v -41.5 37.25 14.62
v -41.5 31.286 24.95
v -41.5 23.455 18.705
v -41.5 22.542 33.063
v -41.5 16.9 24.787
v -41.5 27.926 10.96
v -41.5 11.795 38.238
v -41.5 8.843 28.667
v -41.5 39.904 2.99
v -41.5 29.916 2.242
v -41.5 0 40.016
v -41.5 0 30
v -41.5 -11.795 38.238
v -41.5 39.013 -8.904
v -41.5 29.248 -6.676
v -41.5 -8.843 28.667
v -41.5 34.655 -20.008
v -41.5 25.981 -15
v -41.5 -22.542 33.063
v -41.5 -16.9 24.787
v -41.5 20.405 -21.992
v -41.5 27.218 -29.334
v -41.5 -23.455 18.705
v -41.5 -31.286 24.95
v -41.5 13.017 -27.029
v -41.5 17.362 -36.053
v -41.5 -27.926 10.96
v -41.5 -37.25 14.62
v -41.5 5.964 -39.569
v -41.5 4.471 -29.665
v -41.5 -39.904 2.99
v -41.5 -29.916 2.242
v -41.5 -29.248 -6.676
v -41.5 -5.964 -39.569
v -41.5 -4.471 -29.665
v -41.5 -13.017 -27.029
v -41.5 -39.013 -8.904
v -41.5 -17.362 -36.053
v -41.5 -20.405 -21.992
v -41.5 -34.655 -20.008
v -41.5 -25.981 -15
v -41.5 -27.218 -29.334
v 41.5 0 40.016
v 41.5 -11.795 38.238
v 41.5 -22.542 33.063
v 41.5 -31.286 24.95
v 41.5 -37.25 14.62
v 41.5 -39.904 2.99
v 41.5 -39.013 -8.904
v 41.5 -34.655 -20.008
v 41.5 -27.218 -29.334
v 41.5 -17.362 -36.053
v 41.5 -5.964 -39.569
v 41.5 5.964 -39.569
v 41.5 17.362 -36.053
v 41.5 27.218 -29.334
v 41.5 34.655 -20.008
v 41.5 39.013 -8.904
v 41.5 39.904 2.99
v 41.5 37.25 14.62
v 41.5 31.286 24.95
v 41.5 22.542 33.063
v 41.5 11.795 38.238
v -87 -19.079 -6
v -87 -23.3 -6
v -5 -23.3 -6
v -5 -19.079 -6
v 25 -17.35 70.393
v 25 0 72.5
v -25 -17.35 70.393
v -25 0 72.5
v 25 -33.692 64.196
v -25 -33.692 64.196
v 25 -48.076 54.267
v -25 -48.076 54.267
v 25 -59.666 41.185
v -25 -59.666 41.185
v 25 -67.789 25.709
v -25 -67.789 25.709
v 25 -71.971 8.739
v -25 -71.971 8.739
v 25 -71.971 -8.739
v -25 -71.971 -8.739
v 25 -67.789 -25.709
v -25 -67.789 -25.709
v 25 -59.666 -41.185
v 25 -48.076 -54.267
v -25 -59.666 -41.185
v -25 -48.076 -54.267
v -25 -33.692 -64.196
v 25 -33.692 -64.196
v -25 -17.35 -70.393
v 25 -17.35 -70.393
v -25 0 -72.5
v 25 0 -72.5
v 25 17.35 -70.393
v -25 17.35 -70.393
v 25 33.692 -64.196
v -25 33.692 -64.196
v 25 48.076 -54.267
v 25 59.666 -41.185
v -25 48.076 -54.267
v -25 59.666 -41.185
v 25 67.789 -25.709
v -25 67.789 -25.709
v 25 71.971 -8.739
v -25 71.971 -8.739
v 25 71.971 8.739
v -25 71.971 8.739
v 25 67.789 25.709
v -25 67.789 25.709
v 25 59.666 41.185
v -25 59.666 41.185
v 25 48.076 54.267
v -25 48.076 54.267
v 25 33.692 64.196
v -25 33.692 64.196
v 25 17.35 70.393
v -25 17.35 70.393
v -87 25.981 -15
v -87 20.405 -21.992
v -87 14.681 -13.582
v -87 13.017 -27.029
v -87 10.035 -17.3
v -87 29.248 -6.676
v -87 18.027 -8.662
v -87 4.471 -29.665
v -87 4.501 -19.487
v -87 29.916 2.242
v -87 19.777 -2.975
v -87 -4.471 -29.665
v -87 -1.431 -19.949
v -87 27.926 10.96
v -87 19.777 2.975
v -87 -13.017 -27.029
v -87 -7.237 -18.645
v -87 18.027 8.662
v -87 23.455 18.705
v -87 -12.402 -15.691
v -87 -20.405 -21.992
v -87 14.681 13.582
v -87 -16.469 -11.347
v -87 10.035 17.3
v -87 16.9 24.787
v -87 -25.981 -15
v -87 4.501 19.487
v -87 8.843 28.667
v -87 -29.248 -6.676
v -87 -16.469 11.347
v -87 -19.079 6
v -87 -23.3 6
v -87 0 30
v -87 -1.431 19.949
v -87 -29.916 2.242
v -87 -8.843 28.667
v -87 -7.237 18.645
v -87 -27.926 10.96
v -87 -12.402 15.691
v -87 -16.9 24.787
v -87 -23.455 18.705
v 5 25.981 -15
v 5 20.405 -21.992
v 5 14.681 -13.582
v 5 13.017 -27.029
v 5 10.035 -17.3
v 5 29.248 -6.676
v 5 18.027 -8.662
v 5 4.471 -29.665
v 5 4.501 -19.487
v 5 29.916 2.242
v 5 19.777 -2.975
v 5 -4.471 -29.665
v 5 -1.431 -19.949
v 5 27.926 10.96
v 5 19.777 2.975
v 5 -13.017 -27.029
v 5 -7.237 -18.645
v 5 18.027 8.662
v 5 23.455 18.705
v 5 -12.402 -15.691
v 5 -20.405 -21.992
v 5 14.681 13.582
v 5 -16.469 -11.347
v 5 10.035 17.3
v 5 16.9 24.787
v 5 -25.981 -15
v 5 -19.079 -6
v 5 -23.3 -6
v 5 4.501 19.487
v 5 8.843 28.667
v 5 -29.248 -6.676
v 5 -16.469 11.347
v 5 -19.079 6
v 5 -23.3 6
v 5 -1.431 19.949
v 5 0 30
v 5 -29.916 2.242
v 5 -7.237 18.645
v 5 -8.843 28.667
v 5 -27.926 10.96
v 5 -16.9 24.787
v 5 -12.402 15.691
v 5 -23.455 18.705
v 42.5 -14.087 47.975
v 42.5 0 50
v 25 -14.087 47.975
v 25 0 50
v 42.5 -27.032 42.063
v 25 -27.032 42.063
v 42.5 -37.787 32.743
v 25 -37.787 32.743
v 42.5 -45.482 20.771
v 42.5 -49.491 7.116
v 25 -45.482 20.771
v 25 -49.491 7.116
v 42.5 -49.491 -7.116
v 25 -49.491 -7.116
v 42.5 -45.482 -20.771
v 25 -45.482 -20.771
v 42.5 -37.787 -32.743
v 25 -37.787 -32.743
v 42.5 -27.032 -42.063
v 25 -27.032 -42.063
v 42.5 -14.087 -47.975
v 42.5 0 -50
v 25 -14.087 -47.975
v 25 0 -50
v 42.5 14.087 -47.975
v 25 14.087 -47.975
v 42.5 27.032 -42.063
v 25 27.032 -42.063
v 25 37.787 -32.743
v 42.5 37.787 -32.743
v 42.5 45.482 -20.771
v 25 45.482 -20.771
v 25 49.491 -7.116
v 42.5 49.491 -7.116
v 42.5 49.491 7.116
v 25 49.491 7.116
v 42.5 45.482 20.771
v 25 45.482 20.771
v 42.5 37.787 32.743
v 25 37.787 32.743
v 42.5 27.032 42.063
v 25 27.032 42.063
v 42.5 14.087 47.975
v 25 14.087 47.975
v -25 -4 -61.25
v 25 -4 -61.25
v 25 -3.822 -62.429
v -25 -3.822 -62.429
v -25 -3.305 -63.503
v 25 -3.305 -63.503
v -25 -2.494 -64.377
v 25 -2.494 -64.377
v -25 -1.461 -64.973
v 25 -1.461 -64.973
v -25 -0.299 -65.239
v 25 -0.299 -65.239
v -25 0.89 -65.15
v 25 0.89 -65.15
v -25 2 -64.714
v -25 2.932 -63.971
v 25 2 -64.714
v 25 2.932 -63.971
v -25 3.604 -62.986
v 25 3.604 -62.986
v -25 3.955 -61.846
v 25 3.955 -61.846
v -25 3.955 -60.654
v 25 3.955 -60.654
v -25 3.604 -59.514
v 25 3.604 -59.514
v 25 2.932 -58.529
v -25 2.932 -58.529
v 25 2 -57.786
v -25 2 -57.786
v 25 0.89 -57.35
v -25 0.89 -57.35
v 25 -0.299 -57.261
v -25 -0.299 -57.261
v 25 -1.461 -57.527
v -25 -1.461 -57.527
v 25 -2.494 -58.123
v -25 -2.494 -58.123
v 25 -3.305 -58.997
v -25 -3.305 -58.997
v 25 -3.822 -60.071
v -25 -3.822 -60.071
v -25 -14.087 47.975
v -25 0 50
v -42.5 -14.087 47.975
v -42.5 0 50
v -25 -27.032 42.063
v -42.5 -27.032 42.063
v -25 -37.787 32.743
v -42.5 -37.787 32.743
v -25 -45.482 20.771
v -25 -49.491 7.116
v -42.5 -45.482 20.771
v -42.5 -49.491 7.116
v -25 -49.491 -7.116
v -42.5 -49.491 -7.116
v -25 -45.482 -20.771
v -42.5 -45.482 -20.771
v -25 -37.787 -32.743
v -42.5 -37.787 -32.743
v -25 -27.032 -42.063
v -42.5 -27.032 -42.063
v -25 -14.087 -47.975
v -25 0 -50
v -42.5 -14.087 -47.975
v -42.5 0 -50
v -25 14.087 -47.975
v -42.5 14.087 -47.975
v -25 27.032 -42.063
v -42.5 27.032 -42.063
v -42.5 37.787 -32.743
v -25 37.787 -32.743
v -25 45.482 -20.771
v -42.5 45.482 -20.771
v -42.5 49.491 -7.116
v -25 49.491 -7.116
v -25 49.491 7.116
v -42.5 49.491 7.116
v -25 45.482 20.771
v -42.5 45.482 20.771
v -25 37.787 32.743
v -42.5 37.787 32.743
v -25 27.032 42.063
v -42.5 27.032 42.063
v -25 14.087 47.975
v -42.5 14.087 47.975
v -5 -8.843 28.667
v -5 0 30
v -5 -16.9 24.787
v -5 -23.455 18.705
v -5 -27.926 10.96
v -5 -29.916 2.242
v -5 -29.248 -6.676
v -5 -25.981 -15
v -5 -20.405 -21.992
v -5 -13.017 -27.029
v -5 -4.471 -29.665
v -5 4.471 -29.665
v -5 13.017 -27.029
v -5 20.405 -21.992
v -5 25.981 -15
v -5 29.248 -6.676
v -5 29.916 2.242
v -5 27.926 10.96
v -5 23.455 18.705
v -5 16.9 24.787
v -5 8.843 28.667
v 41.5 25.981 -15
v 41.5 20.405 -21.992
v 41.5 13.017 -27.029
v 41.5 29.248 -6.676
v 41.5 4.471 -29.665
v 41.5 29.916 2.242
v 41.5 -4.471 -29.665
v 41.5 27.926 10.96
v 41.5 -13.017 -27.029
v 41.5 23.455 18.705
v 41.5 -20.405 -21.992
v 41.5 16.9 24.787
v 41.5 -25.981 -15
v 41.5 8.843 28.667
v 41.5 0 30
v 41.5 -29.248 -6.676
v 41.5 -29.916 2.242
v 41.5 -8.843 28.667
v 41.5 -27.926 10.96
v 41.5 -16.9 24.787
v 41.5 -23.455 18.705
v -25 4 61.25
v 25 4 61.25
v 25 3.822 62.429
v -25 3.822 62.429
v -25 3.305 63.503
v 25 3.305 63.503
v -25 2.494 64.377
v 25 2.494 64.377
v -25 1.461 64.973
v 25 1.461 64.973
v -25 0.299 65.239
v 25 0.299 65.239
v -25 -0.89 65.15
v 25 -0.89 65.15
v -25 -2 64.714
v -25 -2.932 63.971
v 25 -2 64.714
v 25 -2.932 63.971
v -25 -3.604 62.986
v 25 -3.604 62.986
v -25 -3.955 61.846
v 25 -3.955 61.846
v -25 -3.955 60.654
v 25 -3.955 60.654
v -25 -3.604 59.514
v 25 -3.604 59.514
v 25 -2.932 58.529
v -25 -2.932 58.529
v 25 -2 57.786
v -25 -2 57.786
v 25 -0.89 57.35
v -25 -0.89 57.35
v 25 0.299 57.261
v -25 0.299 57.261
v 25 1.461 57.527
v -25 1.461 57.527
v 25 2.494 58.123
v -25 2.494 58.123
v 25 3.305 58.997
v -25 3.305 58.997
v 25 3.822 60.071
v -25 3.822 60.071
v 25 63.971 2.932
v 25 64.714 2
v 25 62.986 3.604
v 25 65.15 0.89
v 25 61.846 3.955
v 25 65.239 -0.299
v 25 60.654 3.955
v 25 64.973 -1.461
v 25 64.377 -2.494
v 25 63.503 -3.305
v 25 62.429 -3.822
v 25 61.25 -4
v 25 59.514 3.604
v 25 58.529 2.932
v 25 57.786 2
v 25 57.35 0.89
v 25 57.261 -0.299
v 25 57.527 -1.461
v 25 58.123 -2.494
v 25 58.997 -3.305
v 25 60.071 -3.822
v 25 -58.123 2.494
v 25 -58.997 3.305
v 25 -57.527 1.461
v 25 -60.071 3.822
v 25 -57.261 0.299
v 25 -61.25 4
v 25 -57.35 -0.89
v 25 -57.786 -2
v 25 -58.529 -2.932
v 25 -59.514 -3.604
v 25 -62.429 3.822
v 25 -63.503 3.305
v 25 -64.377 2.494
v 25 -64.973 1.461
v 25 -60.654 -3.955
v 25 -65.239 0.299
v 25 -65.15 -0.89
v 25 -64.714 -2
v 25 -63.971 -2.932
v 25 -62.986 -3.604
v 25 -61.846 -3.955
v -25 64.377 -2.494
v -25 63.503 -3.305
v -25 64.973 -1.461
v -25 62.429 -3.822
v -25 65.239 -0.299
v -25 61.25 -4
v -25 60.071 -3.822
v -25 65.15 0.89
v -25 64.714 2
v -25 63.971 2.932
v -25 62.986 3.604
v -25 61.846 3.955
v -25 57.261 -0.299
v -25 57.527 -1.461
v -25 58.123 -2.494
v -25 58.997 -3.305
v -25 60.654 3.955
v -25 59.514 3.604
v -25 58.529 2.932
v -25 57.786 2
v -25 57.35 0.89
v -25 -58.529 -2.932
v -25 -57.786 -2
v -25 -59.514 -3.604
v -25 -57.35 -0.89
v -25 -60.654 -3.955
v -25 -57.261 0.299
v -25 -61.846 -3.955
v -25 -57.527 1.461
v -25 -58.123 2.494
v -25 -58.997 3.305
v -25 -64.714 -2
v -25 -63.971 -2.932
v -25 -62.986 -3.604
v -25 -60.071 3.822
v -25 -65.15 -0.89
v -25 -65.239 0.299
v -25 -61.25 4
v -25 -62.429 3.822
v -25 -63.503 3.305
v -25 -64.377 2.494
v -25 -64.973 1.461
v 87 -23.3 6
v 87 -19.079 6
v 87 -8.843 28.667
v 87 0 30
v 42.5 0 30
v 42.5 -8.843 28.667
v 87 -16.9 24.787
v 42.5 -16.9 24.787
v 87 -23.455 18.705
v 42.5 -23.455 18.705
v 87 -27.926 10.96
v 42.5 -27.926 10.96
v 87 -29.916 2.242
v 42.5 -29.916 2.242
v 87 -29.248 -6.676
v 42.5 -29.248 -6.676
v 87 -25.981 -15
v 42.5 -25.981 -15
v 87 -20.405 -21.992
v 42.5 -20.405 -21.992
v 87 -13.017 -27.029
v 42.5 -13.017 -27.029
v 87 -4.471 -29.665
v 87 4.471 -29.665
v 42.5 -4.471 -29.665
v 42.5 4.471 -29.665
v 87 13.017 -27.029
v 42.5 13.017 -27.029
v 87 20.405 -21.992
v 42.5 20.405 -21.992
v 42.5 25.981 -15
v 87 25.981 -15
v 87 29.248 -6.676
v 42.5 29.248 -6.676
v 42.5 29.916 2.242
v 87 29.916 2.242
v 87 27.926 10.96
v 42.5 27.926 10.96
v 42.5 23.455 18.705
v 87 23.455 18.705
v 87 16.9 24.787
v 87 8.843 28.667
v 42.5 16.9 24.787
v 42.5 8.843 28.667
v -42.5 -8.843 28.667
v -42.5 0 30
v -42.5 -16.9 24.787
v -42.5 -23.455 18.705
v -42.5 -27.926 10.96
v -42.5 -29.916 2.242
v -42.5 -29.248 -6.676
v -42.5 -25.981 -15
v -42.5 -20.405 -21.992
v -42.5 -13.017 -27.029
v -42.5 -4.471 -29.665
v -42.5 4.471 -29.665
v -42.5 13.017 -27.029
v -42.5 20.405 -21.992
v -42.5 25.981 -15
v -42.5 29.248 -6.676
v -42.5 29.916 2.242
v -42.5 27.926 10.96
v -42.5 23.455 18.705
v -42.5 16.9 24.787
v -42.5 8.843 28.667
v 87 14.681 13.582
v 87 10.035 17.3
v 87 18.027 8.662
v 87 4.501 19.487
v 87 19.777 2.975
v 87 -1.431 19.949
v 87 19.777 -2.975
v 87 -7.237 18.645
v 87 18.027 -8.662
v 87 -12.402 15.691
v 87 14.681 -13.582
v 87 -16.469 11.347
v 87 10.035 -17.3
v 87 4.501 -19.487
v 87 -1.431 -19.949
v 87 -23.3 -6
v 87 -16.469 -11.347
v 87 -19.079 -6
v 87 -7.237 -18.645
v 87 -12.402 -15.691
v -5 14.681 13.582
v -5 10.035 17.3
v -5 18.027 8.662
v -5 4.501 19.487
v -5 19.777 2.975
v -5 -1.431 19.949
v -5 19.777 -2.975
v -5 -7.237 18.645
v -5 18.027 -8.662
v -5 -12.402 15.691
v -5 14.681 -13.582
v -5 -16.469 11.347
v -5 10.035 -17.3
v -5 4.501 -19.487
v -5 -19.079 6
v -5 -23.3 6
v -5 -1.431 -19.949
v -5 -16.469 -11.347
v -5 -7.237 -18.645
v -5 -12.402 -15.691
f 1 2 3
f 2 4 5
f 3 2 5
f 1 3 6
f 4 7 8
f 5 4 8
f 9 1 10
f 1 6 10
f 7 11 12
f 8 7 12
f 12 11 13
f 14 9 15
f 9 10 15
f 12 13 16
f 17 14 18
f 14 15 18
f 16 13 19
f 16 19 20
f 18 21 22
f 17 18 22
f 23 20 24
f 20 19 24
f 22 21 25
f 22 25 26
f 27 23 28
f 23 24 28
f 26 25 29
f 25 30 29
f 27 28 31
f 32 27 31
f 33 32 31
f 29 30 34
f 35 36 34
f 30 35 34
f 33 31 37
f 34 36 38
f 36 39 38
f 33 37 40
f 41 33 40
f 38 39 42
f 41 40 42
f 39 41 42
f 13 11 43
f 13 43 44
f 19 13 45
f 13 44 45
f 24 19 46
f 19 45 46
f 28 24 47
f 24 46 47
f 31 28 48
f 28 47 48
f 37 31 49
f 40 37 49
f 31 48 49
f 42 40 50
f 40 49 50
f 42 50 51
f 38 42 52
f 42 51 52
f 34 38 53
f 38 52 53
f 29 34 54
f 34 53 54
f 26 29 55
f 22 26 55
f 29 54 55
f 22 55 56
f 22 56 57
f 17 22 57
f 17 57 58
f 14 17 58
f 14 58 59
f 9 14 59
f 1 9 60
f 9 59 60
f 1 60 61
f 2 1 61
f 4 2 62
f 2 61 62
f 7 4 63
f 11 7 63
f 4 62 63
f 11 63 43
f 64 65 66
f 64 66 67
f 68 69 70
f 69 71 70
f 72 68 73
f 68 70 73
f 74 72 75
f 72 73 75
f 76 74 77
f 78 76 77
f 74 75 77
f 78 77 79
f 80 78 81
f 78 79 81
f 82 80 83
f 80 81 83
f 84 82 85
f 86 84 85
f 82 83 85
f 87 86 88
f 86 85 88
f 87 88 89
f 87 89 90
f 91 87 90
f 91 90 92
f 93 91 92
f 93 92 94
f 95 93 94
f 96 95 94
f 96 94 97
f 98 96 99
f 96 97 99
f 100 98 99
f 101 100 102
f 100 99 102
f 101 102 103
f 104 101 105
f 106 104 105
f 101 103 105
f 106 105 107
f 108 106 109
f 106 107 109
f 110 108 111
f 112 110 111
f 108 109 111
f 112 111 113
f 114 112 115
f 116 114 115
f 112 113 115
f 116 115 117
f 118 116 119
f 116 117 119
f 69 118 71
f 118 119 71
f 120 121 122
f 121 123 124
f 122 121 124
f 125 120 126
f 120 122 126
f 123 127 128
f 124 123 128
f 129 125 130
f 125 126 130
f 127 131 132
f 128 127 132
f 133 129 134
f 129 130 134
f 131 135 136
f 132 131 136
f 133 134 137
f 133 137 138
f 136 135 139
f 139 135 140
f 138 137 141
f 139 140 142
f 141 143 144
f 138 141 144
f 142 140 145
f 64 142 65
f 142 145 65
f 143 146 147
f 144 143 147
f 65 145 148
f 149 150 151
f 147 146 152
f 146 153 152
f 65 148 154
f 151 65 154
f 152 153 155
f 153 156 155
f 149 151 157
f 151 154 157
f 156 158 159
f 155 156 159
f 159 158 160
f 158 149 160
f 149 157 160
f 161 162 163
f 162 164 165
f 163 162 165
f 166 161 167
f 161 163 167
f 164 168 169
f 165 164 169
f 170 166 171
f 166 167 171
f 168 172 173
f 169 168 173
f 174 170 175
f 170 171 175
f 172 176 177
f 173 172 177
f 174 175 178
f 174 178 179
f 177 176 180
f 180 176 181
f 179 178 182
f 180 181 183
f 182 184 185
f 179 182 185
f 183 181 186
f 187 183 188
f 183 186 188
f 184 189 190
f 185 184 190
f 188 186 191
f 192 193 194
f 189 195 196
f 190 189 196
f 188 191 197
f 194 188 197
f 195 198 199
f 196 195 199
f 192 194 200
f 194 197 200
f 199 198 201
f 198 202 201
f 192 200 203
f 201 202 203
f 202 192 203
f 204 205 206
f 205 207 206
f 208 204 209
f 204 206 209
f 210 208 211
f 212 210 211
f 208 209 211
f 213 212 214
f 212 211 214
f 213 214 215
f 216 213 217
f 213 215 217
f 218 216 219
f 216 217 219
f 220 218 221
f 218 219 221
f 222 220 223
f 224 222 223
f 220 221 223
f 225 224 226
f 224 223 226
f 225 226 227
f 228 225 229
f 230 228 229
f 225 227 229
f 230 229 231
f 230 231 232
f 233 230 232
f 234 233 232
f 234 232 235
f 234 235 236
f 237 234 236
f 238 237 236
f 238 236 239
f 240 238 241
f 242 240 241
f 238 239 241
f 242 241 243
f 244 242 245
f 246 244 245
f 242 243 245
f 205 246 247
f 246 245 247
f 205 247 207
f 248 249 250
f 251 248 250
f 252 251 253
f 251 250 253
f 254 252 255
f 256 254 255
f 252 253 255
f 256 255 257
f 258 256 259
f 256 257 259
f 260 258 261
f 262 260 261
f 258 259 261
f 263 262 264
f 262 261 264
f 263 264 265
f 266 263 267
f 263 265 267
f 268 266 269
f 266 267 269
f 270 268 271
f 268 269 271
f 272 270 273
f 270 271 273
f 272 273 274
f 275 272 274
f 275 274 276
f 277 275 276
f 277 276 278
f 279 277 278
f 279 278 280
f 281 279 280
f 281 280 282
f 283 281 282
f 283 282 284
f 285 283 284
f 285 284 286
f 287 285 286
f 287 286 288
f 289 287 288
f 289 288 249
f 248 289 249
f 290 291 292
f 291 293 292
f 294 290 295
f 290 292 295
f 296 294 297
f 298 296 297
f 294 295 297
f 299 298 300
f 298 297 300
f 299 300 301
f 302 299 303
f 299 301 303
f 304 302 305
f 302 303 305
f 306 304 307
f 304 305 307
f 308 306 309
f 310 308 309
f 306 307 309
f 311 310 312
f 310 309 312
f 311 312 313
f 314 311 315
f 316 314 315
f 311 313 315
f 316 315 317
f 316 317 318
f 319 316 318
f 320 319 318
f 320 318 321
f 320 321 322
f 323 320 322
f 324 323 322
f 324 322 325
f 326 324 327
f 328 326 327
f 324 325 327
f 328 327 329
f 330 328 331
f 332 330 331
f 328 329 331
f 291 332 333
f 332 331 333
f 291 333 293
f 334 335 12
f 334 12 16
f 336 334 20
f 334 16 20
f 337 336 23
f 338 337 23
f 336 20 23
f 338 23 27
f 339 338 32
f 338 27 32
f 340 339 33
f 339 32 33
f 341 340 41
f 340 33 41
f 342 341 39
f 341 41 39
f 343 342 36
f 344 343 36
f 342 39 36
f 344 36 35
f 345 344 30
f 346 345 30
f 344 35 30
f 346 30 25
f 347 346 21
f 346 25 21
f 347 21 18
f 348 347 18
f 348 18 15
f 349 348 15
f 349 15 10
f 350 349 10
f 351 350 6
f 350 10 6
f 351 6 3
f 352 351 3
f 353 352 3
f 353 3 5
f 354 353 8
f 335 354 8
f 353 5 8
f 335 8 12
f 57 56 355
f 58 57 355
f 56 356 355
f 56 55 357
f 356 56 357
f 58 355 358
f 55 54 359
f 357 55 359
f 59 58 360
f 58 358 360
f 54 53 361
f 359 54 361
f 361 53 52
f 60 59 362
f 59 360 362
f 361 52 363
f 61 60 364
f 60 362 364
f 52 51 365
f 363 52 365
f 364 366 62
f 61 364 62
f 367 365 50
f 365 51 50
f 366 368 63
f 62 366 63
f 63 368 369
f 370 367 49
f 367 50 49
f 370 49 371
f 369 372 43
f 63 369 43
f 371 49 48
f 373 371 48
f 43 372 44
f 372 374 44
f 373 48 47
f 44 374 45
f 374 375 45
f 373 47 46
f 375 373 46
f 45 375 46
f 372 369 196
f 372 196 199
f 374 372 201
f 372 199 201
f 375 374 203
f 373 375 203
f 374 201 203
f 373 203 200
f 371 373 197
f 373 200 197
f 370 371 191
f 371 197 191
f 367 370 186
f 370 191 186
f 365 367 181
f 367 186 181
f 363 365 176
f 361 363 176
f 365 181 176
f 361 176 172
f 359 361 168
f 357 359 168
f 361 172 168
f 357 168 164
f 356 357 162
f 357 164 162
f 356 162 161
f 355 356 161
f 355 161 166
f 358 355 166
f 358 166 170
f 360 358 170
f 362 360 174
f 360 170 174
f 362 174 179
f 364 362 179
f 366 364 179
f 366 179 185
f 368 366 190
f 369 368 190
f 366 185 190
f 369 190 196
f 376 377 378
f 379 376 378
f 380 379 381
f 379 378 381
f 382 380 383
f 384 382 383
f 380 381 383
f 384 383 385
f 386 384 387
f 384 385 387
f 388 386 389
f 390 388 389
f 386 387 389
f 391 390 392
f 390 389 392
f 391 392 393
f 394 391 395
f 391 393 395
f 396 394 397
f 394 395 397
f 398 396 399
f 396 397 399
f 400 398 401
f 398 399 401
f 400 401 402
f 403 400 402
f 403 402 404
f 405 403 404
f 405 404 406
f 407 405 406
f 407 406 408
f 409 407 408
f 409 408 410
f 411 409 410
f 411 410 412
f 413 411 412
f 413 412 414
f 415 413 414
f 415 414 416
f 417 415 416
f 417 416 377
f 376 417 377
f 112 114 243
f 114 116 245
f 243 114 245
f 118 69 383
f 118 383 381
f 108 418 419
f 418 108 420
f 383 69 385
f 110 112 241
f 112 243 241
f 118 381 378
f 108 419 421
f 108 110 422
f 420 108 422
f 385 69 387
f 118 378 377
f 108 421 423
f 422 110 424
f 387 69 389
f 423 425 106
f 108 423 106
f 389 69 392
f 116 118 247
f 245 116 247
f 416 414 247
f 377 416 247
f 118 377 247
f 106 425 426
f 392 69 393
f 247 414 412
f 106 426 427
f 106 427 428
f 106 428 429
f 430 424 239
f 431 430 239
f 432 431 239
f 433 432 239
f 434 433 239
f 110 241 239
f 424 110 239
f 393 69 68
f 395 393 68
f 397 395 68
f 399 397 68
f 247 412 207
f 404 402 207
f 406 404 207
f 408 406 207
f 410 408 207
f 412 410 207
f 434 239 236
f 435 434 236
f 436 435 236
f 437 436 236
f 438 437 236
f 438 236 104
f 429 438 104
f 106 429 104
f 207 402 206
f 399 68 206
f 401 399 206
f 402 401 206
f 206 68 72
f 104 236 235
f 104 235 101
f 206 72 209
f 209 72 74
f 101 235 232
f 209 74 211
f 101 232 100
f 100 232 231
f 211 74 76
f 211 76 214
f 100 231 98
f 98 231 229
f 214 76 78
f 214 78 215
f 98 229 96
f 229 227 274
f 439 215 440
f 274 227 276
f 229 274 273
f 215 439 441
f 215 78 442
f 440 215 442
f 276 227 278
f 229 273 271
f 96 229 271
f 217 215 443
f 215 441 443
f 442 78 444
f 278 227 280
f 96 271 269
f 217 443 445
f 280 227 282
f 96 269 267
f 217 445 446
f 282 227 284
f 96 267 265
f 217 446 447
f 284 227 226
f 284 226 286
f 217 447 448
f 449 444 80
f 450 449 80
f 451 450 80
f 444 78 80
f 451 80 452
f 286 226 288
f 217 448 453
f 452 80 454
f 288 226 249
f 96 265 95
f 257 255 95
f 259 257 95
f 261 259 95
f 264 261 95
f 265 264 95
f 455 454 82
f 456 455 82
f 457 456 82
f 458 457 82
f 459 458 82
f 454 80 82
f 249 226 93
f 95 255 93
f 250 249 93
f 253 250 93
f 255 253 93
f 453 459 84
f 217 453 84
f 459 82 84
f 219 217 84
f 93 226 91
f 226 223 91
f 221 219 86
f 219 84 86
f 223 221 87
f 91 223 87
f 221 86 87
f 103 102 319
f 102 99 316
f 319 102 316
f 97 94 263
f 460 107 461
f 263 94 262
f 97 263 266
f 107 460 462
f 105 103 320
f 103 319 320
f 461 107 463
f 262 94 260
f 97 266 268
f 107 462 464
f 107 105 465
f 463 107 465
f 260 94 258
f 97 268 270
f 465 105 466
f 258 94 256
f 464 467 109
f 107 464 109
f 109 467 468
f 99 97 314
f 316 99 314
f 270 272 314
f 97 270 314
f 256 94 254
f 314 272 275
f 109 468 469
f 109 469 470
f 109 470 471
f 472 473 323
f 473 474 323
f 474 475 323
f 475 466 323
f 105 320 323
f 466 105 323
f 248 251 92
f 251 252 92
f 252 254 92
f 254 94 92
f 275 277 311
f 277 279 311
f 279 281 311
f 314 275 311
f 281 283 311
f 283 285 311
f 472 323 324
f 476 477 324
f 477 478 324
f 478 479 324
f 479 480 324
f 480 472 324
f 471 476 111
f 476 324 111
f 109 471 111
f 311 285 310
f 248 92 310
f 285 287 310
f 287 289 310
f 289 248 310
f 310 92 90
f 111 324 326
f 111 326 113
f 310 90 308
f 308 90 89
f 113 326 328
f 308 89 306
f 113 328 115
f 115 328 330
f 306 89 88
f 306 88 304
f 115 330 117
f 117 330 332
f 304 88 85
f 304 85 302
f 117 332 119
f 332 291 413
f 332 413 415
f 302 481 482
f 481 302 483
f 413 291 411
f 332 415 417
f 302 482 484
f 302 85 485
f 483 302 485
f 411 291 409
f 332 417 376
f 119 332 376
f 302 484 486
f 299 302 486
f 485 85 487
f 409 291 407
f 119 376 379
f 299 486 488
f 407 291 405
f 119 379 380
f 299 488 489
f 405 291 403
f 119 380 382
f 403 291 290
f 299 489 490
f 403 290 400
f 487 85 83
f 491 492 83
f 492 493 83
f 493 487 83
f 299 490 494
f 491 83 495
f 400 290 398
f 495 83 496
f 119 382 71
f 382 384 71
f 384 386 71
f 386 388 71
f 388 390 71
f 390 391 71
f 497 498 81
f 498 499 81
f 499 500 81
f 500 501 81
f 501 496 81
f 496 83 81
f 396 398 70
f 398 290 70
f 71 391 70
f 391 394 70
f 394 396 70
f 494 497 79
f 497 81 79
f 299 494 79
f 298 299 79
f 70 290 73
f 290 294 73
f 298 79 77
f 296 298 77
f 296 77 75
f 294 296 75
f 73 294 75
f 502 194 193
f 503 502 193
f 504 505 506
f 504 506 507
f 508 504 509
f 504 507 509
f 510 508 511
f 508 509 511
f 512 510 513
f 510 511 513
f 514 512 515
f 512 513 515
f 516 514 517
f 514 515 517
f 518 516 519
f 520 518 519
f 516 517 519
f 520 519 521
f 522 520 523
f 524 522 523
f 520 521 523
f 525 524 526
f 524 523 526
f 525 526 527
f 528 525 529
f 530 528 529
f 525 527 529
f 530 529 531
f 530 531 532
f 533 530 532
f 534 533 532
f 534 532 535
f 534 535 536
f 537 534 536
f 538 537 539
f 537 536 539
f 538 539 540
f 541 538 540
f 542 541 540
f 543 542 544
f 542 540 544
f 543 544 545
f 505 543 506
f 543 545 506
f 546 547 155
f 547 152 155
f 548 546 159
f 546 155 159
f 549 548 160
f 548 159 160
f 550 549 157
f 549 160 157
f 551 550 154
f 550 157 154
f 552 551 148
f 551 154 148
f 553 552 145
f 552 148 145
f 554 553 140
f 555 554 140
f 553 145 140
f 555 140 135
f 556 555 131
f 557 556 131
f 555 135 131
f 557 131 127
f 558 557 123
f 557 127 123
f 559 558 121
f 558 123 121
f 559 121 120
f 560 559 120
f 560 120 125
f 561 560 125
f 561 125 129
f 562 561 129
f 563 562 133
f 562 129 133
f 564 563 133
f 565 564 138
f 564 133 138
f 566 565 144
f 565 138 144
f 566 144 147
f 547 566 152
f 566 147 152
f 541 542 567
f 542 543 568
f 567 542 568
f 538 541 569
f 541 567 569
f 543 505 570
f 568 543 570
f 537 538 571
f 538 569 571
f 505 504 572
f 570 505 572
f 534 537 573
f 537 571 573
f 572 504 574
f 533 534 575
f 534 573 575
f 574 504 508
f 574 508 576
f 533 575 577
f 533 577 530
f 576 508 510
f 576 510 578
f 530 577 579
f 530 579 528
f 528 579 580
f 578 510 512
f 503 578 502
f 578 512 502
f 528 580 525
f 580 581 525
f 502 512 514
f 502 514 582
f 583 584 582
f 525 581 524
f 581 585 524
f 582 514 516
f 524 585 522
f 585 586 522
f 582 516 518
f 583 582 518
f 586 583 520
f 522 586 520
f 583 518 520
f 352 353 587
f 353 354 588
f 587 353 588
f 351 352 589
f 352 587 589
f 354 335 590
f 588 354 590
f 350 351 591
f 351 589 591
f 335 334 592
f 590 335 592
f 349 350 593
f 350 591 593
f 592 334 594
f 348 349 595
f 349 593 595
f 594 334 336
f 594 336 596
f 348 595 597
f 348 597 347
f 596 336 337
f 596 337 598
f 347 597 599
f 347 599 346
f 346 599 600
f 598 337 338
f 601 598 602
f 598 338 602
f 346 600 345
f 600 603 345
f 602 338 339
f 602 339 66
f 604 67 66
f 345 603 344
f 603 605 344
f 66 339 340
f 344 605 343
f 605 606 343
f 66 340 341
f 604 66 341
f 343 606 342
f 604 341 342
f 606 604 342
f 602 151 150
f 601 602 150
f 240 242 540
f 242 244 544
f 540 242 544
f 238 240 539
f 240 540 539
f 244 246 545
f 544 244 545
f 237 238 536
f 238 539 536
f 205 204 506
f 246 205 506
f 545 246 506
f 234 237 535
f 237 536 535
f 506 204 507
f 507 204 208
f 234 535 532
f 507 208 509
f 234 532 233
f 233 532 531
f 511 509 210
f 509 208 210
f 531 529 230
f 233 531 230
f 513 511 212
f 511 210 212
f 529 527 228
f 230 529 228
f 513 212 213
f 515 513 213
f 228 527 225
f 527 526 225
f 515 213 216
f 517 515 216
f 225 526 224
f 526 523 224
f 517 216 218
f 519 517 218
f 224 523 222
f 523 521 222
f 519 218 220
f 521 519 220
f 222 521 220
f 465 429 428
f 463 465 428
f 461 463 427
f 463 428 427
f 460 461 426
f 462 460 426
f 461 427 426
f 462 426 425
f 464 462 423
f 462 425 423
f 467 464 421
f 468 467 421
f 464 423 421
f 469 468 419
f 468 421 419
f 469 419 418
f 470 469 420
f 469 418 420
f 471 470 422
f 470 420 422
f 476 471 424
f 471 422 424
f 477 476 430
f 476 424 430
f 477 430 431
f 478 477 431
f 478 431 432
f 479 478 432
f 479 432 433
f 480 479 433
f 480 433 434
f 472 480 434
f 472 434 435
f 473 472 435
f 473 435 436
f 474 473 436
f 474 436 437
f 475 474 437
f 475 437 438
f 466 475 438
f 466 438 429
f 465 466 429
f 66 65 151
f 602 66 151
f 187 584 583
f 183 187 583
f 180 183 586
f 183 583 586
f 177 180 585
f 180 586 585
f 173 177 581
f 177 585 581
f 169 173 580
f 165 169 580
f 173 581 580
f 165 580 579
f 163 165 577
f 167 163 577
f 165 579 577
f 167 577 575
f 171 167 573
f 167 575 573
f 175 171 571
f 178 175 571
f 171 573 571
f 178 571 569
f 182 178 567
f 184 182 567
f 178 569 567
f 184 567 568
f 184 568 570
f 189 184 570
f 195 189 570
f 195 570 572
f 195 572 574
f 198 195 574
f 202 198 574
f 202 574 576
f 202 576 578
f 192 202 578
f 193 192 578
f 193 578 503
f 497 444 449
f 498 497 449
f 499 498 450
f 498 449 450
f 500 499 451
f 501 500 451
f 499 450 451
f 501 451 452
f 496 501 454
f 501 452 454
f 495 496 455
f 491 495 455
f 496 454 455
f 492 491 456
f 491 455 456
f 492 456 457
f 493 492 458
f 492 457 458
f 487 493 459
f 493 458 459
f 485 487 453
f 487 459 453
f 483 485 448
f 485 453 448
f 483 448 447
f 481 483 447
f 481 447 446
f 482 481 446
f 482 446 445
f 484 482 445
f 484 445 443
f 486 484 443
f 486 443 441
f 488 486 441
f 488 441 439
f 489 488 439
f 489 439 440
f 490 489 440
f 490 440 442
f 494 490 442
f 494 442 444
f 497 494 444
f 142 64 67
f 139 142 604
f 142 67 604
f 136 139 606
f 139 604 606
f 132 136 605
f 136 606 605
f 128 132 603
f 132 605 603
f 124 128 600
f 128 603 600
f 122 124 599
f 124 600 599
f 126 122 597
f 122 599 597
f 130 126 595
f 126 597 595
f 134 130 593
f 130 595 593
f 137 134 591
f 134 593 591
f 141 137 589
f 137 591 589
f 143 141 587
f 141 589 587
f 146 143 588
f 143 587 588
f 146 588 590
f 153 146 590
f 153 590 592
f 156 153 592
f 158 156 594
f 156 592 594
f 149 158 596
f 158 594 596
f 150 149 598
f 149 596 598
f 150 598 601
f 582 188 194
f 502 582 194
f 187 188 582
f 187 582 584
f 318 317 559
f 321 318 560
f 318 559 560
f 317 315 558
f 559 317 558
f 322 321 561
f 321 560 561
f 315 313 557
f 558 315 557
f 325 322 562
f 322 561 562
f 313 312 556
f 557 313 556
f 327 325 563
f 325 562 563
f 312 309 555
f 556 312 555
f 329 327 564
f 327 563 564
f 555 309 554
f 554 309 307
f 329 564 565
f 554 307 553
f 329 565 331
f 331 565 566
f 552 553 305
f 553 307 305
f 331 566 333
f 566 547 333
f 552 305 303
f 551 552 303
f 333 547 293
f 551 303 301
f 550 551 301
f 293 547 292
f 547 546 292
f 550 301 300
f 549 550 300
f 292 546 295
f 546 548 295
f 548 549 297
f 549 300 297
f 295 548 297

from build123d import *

# Parameters (mm, degrees)
SKETCH_2_R               = 4
CUT_EXTRUDE_1_DEPTH      = 152.843669608
PATTERN_CIRCULAR_1_COUNT = 4
SKETCH_4_W               = 12
SKETCH_4_H               = 23.3
CUT_EXTRUDE_2_DEPTH      = 202.961630019


with BuildPart() as part:
    # Эскиз1 → Повернуть1 (revolve)
    with BuildSketch(Plane.XY, mode=Mode.PRIVATE) as revolve_1_sk:
        Polygon((-5, 20), (-5, 30), (-41.5, 30), (-41.5, 40.016205048), (41.5, 40.016205048), (41.5, 30), (5, 30), (5, 20), (87, 20), (87, 30), (42.5, 30), (42.5, 50), (25, 50), (25, 72.5), (-25, 72.5), (-25, 50), (-42.5, 50), (-42.5, 30), (-87, 30), (-87, 20), align=None)
    revolve(revolve_1_sk.sketch.rotate(Axis((-171.104100946, 0, 0), (1, 0, 0)), 90), axis=Axis((-171.104100946, 0, 0), (1, 0, 0)))

    # Эскиз2 → Вырез-Вытянуть1 (cut, through all)
    with BuildSketch(Plane(origin=(25, 0, 0), x_dir=(0, 0, -1), z_dir=(1, 0, 0))):
        with Locations((0, 61.25)):
            Circle(SKETCH_2_R)
    cut_extrude_1 = extrude(amount=-CUT_EXTRUDE_1_DEPTH, mode=Mode.SUBTRACT)

    # Круговой массив1: Вырез-Вытянуть1 ×4 about axis
    pattern_circular_1_axis = Axis((0, 0, 0), (1, 0, 0))
    for i in range(1, PATTERN_CIRCULAR_1_COUNT):
        add(cut_extrude_1.rotate(pattern_circular_1_axis, i * 360 / PATTERN_CIRCULAR_1_COUNT), mode=Mode.SUBTRACT)

    # Эскиз4 → Вырез-Вытянуть2 (cut, through all)
    with BuildSketch(Plane.ZY.offset(87)):
        with Locations((0, -11.65)):
            Rectangle(SKETCH_4_W, SKETCH_4_H)
    extrude(amount=-CUT_EXTRUDE_2_DEPTH, mode=Mode.SUBTRACT)


solid = part.part
